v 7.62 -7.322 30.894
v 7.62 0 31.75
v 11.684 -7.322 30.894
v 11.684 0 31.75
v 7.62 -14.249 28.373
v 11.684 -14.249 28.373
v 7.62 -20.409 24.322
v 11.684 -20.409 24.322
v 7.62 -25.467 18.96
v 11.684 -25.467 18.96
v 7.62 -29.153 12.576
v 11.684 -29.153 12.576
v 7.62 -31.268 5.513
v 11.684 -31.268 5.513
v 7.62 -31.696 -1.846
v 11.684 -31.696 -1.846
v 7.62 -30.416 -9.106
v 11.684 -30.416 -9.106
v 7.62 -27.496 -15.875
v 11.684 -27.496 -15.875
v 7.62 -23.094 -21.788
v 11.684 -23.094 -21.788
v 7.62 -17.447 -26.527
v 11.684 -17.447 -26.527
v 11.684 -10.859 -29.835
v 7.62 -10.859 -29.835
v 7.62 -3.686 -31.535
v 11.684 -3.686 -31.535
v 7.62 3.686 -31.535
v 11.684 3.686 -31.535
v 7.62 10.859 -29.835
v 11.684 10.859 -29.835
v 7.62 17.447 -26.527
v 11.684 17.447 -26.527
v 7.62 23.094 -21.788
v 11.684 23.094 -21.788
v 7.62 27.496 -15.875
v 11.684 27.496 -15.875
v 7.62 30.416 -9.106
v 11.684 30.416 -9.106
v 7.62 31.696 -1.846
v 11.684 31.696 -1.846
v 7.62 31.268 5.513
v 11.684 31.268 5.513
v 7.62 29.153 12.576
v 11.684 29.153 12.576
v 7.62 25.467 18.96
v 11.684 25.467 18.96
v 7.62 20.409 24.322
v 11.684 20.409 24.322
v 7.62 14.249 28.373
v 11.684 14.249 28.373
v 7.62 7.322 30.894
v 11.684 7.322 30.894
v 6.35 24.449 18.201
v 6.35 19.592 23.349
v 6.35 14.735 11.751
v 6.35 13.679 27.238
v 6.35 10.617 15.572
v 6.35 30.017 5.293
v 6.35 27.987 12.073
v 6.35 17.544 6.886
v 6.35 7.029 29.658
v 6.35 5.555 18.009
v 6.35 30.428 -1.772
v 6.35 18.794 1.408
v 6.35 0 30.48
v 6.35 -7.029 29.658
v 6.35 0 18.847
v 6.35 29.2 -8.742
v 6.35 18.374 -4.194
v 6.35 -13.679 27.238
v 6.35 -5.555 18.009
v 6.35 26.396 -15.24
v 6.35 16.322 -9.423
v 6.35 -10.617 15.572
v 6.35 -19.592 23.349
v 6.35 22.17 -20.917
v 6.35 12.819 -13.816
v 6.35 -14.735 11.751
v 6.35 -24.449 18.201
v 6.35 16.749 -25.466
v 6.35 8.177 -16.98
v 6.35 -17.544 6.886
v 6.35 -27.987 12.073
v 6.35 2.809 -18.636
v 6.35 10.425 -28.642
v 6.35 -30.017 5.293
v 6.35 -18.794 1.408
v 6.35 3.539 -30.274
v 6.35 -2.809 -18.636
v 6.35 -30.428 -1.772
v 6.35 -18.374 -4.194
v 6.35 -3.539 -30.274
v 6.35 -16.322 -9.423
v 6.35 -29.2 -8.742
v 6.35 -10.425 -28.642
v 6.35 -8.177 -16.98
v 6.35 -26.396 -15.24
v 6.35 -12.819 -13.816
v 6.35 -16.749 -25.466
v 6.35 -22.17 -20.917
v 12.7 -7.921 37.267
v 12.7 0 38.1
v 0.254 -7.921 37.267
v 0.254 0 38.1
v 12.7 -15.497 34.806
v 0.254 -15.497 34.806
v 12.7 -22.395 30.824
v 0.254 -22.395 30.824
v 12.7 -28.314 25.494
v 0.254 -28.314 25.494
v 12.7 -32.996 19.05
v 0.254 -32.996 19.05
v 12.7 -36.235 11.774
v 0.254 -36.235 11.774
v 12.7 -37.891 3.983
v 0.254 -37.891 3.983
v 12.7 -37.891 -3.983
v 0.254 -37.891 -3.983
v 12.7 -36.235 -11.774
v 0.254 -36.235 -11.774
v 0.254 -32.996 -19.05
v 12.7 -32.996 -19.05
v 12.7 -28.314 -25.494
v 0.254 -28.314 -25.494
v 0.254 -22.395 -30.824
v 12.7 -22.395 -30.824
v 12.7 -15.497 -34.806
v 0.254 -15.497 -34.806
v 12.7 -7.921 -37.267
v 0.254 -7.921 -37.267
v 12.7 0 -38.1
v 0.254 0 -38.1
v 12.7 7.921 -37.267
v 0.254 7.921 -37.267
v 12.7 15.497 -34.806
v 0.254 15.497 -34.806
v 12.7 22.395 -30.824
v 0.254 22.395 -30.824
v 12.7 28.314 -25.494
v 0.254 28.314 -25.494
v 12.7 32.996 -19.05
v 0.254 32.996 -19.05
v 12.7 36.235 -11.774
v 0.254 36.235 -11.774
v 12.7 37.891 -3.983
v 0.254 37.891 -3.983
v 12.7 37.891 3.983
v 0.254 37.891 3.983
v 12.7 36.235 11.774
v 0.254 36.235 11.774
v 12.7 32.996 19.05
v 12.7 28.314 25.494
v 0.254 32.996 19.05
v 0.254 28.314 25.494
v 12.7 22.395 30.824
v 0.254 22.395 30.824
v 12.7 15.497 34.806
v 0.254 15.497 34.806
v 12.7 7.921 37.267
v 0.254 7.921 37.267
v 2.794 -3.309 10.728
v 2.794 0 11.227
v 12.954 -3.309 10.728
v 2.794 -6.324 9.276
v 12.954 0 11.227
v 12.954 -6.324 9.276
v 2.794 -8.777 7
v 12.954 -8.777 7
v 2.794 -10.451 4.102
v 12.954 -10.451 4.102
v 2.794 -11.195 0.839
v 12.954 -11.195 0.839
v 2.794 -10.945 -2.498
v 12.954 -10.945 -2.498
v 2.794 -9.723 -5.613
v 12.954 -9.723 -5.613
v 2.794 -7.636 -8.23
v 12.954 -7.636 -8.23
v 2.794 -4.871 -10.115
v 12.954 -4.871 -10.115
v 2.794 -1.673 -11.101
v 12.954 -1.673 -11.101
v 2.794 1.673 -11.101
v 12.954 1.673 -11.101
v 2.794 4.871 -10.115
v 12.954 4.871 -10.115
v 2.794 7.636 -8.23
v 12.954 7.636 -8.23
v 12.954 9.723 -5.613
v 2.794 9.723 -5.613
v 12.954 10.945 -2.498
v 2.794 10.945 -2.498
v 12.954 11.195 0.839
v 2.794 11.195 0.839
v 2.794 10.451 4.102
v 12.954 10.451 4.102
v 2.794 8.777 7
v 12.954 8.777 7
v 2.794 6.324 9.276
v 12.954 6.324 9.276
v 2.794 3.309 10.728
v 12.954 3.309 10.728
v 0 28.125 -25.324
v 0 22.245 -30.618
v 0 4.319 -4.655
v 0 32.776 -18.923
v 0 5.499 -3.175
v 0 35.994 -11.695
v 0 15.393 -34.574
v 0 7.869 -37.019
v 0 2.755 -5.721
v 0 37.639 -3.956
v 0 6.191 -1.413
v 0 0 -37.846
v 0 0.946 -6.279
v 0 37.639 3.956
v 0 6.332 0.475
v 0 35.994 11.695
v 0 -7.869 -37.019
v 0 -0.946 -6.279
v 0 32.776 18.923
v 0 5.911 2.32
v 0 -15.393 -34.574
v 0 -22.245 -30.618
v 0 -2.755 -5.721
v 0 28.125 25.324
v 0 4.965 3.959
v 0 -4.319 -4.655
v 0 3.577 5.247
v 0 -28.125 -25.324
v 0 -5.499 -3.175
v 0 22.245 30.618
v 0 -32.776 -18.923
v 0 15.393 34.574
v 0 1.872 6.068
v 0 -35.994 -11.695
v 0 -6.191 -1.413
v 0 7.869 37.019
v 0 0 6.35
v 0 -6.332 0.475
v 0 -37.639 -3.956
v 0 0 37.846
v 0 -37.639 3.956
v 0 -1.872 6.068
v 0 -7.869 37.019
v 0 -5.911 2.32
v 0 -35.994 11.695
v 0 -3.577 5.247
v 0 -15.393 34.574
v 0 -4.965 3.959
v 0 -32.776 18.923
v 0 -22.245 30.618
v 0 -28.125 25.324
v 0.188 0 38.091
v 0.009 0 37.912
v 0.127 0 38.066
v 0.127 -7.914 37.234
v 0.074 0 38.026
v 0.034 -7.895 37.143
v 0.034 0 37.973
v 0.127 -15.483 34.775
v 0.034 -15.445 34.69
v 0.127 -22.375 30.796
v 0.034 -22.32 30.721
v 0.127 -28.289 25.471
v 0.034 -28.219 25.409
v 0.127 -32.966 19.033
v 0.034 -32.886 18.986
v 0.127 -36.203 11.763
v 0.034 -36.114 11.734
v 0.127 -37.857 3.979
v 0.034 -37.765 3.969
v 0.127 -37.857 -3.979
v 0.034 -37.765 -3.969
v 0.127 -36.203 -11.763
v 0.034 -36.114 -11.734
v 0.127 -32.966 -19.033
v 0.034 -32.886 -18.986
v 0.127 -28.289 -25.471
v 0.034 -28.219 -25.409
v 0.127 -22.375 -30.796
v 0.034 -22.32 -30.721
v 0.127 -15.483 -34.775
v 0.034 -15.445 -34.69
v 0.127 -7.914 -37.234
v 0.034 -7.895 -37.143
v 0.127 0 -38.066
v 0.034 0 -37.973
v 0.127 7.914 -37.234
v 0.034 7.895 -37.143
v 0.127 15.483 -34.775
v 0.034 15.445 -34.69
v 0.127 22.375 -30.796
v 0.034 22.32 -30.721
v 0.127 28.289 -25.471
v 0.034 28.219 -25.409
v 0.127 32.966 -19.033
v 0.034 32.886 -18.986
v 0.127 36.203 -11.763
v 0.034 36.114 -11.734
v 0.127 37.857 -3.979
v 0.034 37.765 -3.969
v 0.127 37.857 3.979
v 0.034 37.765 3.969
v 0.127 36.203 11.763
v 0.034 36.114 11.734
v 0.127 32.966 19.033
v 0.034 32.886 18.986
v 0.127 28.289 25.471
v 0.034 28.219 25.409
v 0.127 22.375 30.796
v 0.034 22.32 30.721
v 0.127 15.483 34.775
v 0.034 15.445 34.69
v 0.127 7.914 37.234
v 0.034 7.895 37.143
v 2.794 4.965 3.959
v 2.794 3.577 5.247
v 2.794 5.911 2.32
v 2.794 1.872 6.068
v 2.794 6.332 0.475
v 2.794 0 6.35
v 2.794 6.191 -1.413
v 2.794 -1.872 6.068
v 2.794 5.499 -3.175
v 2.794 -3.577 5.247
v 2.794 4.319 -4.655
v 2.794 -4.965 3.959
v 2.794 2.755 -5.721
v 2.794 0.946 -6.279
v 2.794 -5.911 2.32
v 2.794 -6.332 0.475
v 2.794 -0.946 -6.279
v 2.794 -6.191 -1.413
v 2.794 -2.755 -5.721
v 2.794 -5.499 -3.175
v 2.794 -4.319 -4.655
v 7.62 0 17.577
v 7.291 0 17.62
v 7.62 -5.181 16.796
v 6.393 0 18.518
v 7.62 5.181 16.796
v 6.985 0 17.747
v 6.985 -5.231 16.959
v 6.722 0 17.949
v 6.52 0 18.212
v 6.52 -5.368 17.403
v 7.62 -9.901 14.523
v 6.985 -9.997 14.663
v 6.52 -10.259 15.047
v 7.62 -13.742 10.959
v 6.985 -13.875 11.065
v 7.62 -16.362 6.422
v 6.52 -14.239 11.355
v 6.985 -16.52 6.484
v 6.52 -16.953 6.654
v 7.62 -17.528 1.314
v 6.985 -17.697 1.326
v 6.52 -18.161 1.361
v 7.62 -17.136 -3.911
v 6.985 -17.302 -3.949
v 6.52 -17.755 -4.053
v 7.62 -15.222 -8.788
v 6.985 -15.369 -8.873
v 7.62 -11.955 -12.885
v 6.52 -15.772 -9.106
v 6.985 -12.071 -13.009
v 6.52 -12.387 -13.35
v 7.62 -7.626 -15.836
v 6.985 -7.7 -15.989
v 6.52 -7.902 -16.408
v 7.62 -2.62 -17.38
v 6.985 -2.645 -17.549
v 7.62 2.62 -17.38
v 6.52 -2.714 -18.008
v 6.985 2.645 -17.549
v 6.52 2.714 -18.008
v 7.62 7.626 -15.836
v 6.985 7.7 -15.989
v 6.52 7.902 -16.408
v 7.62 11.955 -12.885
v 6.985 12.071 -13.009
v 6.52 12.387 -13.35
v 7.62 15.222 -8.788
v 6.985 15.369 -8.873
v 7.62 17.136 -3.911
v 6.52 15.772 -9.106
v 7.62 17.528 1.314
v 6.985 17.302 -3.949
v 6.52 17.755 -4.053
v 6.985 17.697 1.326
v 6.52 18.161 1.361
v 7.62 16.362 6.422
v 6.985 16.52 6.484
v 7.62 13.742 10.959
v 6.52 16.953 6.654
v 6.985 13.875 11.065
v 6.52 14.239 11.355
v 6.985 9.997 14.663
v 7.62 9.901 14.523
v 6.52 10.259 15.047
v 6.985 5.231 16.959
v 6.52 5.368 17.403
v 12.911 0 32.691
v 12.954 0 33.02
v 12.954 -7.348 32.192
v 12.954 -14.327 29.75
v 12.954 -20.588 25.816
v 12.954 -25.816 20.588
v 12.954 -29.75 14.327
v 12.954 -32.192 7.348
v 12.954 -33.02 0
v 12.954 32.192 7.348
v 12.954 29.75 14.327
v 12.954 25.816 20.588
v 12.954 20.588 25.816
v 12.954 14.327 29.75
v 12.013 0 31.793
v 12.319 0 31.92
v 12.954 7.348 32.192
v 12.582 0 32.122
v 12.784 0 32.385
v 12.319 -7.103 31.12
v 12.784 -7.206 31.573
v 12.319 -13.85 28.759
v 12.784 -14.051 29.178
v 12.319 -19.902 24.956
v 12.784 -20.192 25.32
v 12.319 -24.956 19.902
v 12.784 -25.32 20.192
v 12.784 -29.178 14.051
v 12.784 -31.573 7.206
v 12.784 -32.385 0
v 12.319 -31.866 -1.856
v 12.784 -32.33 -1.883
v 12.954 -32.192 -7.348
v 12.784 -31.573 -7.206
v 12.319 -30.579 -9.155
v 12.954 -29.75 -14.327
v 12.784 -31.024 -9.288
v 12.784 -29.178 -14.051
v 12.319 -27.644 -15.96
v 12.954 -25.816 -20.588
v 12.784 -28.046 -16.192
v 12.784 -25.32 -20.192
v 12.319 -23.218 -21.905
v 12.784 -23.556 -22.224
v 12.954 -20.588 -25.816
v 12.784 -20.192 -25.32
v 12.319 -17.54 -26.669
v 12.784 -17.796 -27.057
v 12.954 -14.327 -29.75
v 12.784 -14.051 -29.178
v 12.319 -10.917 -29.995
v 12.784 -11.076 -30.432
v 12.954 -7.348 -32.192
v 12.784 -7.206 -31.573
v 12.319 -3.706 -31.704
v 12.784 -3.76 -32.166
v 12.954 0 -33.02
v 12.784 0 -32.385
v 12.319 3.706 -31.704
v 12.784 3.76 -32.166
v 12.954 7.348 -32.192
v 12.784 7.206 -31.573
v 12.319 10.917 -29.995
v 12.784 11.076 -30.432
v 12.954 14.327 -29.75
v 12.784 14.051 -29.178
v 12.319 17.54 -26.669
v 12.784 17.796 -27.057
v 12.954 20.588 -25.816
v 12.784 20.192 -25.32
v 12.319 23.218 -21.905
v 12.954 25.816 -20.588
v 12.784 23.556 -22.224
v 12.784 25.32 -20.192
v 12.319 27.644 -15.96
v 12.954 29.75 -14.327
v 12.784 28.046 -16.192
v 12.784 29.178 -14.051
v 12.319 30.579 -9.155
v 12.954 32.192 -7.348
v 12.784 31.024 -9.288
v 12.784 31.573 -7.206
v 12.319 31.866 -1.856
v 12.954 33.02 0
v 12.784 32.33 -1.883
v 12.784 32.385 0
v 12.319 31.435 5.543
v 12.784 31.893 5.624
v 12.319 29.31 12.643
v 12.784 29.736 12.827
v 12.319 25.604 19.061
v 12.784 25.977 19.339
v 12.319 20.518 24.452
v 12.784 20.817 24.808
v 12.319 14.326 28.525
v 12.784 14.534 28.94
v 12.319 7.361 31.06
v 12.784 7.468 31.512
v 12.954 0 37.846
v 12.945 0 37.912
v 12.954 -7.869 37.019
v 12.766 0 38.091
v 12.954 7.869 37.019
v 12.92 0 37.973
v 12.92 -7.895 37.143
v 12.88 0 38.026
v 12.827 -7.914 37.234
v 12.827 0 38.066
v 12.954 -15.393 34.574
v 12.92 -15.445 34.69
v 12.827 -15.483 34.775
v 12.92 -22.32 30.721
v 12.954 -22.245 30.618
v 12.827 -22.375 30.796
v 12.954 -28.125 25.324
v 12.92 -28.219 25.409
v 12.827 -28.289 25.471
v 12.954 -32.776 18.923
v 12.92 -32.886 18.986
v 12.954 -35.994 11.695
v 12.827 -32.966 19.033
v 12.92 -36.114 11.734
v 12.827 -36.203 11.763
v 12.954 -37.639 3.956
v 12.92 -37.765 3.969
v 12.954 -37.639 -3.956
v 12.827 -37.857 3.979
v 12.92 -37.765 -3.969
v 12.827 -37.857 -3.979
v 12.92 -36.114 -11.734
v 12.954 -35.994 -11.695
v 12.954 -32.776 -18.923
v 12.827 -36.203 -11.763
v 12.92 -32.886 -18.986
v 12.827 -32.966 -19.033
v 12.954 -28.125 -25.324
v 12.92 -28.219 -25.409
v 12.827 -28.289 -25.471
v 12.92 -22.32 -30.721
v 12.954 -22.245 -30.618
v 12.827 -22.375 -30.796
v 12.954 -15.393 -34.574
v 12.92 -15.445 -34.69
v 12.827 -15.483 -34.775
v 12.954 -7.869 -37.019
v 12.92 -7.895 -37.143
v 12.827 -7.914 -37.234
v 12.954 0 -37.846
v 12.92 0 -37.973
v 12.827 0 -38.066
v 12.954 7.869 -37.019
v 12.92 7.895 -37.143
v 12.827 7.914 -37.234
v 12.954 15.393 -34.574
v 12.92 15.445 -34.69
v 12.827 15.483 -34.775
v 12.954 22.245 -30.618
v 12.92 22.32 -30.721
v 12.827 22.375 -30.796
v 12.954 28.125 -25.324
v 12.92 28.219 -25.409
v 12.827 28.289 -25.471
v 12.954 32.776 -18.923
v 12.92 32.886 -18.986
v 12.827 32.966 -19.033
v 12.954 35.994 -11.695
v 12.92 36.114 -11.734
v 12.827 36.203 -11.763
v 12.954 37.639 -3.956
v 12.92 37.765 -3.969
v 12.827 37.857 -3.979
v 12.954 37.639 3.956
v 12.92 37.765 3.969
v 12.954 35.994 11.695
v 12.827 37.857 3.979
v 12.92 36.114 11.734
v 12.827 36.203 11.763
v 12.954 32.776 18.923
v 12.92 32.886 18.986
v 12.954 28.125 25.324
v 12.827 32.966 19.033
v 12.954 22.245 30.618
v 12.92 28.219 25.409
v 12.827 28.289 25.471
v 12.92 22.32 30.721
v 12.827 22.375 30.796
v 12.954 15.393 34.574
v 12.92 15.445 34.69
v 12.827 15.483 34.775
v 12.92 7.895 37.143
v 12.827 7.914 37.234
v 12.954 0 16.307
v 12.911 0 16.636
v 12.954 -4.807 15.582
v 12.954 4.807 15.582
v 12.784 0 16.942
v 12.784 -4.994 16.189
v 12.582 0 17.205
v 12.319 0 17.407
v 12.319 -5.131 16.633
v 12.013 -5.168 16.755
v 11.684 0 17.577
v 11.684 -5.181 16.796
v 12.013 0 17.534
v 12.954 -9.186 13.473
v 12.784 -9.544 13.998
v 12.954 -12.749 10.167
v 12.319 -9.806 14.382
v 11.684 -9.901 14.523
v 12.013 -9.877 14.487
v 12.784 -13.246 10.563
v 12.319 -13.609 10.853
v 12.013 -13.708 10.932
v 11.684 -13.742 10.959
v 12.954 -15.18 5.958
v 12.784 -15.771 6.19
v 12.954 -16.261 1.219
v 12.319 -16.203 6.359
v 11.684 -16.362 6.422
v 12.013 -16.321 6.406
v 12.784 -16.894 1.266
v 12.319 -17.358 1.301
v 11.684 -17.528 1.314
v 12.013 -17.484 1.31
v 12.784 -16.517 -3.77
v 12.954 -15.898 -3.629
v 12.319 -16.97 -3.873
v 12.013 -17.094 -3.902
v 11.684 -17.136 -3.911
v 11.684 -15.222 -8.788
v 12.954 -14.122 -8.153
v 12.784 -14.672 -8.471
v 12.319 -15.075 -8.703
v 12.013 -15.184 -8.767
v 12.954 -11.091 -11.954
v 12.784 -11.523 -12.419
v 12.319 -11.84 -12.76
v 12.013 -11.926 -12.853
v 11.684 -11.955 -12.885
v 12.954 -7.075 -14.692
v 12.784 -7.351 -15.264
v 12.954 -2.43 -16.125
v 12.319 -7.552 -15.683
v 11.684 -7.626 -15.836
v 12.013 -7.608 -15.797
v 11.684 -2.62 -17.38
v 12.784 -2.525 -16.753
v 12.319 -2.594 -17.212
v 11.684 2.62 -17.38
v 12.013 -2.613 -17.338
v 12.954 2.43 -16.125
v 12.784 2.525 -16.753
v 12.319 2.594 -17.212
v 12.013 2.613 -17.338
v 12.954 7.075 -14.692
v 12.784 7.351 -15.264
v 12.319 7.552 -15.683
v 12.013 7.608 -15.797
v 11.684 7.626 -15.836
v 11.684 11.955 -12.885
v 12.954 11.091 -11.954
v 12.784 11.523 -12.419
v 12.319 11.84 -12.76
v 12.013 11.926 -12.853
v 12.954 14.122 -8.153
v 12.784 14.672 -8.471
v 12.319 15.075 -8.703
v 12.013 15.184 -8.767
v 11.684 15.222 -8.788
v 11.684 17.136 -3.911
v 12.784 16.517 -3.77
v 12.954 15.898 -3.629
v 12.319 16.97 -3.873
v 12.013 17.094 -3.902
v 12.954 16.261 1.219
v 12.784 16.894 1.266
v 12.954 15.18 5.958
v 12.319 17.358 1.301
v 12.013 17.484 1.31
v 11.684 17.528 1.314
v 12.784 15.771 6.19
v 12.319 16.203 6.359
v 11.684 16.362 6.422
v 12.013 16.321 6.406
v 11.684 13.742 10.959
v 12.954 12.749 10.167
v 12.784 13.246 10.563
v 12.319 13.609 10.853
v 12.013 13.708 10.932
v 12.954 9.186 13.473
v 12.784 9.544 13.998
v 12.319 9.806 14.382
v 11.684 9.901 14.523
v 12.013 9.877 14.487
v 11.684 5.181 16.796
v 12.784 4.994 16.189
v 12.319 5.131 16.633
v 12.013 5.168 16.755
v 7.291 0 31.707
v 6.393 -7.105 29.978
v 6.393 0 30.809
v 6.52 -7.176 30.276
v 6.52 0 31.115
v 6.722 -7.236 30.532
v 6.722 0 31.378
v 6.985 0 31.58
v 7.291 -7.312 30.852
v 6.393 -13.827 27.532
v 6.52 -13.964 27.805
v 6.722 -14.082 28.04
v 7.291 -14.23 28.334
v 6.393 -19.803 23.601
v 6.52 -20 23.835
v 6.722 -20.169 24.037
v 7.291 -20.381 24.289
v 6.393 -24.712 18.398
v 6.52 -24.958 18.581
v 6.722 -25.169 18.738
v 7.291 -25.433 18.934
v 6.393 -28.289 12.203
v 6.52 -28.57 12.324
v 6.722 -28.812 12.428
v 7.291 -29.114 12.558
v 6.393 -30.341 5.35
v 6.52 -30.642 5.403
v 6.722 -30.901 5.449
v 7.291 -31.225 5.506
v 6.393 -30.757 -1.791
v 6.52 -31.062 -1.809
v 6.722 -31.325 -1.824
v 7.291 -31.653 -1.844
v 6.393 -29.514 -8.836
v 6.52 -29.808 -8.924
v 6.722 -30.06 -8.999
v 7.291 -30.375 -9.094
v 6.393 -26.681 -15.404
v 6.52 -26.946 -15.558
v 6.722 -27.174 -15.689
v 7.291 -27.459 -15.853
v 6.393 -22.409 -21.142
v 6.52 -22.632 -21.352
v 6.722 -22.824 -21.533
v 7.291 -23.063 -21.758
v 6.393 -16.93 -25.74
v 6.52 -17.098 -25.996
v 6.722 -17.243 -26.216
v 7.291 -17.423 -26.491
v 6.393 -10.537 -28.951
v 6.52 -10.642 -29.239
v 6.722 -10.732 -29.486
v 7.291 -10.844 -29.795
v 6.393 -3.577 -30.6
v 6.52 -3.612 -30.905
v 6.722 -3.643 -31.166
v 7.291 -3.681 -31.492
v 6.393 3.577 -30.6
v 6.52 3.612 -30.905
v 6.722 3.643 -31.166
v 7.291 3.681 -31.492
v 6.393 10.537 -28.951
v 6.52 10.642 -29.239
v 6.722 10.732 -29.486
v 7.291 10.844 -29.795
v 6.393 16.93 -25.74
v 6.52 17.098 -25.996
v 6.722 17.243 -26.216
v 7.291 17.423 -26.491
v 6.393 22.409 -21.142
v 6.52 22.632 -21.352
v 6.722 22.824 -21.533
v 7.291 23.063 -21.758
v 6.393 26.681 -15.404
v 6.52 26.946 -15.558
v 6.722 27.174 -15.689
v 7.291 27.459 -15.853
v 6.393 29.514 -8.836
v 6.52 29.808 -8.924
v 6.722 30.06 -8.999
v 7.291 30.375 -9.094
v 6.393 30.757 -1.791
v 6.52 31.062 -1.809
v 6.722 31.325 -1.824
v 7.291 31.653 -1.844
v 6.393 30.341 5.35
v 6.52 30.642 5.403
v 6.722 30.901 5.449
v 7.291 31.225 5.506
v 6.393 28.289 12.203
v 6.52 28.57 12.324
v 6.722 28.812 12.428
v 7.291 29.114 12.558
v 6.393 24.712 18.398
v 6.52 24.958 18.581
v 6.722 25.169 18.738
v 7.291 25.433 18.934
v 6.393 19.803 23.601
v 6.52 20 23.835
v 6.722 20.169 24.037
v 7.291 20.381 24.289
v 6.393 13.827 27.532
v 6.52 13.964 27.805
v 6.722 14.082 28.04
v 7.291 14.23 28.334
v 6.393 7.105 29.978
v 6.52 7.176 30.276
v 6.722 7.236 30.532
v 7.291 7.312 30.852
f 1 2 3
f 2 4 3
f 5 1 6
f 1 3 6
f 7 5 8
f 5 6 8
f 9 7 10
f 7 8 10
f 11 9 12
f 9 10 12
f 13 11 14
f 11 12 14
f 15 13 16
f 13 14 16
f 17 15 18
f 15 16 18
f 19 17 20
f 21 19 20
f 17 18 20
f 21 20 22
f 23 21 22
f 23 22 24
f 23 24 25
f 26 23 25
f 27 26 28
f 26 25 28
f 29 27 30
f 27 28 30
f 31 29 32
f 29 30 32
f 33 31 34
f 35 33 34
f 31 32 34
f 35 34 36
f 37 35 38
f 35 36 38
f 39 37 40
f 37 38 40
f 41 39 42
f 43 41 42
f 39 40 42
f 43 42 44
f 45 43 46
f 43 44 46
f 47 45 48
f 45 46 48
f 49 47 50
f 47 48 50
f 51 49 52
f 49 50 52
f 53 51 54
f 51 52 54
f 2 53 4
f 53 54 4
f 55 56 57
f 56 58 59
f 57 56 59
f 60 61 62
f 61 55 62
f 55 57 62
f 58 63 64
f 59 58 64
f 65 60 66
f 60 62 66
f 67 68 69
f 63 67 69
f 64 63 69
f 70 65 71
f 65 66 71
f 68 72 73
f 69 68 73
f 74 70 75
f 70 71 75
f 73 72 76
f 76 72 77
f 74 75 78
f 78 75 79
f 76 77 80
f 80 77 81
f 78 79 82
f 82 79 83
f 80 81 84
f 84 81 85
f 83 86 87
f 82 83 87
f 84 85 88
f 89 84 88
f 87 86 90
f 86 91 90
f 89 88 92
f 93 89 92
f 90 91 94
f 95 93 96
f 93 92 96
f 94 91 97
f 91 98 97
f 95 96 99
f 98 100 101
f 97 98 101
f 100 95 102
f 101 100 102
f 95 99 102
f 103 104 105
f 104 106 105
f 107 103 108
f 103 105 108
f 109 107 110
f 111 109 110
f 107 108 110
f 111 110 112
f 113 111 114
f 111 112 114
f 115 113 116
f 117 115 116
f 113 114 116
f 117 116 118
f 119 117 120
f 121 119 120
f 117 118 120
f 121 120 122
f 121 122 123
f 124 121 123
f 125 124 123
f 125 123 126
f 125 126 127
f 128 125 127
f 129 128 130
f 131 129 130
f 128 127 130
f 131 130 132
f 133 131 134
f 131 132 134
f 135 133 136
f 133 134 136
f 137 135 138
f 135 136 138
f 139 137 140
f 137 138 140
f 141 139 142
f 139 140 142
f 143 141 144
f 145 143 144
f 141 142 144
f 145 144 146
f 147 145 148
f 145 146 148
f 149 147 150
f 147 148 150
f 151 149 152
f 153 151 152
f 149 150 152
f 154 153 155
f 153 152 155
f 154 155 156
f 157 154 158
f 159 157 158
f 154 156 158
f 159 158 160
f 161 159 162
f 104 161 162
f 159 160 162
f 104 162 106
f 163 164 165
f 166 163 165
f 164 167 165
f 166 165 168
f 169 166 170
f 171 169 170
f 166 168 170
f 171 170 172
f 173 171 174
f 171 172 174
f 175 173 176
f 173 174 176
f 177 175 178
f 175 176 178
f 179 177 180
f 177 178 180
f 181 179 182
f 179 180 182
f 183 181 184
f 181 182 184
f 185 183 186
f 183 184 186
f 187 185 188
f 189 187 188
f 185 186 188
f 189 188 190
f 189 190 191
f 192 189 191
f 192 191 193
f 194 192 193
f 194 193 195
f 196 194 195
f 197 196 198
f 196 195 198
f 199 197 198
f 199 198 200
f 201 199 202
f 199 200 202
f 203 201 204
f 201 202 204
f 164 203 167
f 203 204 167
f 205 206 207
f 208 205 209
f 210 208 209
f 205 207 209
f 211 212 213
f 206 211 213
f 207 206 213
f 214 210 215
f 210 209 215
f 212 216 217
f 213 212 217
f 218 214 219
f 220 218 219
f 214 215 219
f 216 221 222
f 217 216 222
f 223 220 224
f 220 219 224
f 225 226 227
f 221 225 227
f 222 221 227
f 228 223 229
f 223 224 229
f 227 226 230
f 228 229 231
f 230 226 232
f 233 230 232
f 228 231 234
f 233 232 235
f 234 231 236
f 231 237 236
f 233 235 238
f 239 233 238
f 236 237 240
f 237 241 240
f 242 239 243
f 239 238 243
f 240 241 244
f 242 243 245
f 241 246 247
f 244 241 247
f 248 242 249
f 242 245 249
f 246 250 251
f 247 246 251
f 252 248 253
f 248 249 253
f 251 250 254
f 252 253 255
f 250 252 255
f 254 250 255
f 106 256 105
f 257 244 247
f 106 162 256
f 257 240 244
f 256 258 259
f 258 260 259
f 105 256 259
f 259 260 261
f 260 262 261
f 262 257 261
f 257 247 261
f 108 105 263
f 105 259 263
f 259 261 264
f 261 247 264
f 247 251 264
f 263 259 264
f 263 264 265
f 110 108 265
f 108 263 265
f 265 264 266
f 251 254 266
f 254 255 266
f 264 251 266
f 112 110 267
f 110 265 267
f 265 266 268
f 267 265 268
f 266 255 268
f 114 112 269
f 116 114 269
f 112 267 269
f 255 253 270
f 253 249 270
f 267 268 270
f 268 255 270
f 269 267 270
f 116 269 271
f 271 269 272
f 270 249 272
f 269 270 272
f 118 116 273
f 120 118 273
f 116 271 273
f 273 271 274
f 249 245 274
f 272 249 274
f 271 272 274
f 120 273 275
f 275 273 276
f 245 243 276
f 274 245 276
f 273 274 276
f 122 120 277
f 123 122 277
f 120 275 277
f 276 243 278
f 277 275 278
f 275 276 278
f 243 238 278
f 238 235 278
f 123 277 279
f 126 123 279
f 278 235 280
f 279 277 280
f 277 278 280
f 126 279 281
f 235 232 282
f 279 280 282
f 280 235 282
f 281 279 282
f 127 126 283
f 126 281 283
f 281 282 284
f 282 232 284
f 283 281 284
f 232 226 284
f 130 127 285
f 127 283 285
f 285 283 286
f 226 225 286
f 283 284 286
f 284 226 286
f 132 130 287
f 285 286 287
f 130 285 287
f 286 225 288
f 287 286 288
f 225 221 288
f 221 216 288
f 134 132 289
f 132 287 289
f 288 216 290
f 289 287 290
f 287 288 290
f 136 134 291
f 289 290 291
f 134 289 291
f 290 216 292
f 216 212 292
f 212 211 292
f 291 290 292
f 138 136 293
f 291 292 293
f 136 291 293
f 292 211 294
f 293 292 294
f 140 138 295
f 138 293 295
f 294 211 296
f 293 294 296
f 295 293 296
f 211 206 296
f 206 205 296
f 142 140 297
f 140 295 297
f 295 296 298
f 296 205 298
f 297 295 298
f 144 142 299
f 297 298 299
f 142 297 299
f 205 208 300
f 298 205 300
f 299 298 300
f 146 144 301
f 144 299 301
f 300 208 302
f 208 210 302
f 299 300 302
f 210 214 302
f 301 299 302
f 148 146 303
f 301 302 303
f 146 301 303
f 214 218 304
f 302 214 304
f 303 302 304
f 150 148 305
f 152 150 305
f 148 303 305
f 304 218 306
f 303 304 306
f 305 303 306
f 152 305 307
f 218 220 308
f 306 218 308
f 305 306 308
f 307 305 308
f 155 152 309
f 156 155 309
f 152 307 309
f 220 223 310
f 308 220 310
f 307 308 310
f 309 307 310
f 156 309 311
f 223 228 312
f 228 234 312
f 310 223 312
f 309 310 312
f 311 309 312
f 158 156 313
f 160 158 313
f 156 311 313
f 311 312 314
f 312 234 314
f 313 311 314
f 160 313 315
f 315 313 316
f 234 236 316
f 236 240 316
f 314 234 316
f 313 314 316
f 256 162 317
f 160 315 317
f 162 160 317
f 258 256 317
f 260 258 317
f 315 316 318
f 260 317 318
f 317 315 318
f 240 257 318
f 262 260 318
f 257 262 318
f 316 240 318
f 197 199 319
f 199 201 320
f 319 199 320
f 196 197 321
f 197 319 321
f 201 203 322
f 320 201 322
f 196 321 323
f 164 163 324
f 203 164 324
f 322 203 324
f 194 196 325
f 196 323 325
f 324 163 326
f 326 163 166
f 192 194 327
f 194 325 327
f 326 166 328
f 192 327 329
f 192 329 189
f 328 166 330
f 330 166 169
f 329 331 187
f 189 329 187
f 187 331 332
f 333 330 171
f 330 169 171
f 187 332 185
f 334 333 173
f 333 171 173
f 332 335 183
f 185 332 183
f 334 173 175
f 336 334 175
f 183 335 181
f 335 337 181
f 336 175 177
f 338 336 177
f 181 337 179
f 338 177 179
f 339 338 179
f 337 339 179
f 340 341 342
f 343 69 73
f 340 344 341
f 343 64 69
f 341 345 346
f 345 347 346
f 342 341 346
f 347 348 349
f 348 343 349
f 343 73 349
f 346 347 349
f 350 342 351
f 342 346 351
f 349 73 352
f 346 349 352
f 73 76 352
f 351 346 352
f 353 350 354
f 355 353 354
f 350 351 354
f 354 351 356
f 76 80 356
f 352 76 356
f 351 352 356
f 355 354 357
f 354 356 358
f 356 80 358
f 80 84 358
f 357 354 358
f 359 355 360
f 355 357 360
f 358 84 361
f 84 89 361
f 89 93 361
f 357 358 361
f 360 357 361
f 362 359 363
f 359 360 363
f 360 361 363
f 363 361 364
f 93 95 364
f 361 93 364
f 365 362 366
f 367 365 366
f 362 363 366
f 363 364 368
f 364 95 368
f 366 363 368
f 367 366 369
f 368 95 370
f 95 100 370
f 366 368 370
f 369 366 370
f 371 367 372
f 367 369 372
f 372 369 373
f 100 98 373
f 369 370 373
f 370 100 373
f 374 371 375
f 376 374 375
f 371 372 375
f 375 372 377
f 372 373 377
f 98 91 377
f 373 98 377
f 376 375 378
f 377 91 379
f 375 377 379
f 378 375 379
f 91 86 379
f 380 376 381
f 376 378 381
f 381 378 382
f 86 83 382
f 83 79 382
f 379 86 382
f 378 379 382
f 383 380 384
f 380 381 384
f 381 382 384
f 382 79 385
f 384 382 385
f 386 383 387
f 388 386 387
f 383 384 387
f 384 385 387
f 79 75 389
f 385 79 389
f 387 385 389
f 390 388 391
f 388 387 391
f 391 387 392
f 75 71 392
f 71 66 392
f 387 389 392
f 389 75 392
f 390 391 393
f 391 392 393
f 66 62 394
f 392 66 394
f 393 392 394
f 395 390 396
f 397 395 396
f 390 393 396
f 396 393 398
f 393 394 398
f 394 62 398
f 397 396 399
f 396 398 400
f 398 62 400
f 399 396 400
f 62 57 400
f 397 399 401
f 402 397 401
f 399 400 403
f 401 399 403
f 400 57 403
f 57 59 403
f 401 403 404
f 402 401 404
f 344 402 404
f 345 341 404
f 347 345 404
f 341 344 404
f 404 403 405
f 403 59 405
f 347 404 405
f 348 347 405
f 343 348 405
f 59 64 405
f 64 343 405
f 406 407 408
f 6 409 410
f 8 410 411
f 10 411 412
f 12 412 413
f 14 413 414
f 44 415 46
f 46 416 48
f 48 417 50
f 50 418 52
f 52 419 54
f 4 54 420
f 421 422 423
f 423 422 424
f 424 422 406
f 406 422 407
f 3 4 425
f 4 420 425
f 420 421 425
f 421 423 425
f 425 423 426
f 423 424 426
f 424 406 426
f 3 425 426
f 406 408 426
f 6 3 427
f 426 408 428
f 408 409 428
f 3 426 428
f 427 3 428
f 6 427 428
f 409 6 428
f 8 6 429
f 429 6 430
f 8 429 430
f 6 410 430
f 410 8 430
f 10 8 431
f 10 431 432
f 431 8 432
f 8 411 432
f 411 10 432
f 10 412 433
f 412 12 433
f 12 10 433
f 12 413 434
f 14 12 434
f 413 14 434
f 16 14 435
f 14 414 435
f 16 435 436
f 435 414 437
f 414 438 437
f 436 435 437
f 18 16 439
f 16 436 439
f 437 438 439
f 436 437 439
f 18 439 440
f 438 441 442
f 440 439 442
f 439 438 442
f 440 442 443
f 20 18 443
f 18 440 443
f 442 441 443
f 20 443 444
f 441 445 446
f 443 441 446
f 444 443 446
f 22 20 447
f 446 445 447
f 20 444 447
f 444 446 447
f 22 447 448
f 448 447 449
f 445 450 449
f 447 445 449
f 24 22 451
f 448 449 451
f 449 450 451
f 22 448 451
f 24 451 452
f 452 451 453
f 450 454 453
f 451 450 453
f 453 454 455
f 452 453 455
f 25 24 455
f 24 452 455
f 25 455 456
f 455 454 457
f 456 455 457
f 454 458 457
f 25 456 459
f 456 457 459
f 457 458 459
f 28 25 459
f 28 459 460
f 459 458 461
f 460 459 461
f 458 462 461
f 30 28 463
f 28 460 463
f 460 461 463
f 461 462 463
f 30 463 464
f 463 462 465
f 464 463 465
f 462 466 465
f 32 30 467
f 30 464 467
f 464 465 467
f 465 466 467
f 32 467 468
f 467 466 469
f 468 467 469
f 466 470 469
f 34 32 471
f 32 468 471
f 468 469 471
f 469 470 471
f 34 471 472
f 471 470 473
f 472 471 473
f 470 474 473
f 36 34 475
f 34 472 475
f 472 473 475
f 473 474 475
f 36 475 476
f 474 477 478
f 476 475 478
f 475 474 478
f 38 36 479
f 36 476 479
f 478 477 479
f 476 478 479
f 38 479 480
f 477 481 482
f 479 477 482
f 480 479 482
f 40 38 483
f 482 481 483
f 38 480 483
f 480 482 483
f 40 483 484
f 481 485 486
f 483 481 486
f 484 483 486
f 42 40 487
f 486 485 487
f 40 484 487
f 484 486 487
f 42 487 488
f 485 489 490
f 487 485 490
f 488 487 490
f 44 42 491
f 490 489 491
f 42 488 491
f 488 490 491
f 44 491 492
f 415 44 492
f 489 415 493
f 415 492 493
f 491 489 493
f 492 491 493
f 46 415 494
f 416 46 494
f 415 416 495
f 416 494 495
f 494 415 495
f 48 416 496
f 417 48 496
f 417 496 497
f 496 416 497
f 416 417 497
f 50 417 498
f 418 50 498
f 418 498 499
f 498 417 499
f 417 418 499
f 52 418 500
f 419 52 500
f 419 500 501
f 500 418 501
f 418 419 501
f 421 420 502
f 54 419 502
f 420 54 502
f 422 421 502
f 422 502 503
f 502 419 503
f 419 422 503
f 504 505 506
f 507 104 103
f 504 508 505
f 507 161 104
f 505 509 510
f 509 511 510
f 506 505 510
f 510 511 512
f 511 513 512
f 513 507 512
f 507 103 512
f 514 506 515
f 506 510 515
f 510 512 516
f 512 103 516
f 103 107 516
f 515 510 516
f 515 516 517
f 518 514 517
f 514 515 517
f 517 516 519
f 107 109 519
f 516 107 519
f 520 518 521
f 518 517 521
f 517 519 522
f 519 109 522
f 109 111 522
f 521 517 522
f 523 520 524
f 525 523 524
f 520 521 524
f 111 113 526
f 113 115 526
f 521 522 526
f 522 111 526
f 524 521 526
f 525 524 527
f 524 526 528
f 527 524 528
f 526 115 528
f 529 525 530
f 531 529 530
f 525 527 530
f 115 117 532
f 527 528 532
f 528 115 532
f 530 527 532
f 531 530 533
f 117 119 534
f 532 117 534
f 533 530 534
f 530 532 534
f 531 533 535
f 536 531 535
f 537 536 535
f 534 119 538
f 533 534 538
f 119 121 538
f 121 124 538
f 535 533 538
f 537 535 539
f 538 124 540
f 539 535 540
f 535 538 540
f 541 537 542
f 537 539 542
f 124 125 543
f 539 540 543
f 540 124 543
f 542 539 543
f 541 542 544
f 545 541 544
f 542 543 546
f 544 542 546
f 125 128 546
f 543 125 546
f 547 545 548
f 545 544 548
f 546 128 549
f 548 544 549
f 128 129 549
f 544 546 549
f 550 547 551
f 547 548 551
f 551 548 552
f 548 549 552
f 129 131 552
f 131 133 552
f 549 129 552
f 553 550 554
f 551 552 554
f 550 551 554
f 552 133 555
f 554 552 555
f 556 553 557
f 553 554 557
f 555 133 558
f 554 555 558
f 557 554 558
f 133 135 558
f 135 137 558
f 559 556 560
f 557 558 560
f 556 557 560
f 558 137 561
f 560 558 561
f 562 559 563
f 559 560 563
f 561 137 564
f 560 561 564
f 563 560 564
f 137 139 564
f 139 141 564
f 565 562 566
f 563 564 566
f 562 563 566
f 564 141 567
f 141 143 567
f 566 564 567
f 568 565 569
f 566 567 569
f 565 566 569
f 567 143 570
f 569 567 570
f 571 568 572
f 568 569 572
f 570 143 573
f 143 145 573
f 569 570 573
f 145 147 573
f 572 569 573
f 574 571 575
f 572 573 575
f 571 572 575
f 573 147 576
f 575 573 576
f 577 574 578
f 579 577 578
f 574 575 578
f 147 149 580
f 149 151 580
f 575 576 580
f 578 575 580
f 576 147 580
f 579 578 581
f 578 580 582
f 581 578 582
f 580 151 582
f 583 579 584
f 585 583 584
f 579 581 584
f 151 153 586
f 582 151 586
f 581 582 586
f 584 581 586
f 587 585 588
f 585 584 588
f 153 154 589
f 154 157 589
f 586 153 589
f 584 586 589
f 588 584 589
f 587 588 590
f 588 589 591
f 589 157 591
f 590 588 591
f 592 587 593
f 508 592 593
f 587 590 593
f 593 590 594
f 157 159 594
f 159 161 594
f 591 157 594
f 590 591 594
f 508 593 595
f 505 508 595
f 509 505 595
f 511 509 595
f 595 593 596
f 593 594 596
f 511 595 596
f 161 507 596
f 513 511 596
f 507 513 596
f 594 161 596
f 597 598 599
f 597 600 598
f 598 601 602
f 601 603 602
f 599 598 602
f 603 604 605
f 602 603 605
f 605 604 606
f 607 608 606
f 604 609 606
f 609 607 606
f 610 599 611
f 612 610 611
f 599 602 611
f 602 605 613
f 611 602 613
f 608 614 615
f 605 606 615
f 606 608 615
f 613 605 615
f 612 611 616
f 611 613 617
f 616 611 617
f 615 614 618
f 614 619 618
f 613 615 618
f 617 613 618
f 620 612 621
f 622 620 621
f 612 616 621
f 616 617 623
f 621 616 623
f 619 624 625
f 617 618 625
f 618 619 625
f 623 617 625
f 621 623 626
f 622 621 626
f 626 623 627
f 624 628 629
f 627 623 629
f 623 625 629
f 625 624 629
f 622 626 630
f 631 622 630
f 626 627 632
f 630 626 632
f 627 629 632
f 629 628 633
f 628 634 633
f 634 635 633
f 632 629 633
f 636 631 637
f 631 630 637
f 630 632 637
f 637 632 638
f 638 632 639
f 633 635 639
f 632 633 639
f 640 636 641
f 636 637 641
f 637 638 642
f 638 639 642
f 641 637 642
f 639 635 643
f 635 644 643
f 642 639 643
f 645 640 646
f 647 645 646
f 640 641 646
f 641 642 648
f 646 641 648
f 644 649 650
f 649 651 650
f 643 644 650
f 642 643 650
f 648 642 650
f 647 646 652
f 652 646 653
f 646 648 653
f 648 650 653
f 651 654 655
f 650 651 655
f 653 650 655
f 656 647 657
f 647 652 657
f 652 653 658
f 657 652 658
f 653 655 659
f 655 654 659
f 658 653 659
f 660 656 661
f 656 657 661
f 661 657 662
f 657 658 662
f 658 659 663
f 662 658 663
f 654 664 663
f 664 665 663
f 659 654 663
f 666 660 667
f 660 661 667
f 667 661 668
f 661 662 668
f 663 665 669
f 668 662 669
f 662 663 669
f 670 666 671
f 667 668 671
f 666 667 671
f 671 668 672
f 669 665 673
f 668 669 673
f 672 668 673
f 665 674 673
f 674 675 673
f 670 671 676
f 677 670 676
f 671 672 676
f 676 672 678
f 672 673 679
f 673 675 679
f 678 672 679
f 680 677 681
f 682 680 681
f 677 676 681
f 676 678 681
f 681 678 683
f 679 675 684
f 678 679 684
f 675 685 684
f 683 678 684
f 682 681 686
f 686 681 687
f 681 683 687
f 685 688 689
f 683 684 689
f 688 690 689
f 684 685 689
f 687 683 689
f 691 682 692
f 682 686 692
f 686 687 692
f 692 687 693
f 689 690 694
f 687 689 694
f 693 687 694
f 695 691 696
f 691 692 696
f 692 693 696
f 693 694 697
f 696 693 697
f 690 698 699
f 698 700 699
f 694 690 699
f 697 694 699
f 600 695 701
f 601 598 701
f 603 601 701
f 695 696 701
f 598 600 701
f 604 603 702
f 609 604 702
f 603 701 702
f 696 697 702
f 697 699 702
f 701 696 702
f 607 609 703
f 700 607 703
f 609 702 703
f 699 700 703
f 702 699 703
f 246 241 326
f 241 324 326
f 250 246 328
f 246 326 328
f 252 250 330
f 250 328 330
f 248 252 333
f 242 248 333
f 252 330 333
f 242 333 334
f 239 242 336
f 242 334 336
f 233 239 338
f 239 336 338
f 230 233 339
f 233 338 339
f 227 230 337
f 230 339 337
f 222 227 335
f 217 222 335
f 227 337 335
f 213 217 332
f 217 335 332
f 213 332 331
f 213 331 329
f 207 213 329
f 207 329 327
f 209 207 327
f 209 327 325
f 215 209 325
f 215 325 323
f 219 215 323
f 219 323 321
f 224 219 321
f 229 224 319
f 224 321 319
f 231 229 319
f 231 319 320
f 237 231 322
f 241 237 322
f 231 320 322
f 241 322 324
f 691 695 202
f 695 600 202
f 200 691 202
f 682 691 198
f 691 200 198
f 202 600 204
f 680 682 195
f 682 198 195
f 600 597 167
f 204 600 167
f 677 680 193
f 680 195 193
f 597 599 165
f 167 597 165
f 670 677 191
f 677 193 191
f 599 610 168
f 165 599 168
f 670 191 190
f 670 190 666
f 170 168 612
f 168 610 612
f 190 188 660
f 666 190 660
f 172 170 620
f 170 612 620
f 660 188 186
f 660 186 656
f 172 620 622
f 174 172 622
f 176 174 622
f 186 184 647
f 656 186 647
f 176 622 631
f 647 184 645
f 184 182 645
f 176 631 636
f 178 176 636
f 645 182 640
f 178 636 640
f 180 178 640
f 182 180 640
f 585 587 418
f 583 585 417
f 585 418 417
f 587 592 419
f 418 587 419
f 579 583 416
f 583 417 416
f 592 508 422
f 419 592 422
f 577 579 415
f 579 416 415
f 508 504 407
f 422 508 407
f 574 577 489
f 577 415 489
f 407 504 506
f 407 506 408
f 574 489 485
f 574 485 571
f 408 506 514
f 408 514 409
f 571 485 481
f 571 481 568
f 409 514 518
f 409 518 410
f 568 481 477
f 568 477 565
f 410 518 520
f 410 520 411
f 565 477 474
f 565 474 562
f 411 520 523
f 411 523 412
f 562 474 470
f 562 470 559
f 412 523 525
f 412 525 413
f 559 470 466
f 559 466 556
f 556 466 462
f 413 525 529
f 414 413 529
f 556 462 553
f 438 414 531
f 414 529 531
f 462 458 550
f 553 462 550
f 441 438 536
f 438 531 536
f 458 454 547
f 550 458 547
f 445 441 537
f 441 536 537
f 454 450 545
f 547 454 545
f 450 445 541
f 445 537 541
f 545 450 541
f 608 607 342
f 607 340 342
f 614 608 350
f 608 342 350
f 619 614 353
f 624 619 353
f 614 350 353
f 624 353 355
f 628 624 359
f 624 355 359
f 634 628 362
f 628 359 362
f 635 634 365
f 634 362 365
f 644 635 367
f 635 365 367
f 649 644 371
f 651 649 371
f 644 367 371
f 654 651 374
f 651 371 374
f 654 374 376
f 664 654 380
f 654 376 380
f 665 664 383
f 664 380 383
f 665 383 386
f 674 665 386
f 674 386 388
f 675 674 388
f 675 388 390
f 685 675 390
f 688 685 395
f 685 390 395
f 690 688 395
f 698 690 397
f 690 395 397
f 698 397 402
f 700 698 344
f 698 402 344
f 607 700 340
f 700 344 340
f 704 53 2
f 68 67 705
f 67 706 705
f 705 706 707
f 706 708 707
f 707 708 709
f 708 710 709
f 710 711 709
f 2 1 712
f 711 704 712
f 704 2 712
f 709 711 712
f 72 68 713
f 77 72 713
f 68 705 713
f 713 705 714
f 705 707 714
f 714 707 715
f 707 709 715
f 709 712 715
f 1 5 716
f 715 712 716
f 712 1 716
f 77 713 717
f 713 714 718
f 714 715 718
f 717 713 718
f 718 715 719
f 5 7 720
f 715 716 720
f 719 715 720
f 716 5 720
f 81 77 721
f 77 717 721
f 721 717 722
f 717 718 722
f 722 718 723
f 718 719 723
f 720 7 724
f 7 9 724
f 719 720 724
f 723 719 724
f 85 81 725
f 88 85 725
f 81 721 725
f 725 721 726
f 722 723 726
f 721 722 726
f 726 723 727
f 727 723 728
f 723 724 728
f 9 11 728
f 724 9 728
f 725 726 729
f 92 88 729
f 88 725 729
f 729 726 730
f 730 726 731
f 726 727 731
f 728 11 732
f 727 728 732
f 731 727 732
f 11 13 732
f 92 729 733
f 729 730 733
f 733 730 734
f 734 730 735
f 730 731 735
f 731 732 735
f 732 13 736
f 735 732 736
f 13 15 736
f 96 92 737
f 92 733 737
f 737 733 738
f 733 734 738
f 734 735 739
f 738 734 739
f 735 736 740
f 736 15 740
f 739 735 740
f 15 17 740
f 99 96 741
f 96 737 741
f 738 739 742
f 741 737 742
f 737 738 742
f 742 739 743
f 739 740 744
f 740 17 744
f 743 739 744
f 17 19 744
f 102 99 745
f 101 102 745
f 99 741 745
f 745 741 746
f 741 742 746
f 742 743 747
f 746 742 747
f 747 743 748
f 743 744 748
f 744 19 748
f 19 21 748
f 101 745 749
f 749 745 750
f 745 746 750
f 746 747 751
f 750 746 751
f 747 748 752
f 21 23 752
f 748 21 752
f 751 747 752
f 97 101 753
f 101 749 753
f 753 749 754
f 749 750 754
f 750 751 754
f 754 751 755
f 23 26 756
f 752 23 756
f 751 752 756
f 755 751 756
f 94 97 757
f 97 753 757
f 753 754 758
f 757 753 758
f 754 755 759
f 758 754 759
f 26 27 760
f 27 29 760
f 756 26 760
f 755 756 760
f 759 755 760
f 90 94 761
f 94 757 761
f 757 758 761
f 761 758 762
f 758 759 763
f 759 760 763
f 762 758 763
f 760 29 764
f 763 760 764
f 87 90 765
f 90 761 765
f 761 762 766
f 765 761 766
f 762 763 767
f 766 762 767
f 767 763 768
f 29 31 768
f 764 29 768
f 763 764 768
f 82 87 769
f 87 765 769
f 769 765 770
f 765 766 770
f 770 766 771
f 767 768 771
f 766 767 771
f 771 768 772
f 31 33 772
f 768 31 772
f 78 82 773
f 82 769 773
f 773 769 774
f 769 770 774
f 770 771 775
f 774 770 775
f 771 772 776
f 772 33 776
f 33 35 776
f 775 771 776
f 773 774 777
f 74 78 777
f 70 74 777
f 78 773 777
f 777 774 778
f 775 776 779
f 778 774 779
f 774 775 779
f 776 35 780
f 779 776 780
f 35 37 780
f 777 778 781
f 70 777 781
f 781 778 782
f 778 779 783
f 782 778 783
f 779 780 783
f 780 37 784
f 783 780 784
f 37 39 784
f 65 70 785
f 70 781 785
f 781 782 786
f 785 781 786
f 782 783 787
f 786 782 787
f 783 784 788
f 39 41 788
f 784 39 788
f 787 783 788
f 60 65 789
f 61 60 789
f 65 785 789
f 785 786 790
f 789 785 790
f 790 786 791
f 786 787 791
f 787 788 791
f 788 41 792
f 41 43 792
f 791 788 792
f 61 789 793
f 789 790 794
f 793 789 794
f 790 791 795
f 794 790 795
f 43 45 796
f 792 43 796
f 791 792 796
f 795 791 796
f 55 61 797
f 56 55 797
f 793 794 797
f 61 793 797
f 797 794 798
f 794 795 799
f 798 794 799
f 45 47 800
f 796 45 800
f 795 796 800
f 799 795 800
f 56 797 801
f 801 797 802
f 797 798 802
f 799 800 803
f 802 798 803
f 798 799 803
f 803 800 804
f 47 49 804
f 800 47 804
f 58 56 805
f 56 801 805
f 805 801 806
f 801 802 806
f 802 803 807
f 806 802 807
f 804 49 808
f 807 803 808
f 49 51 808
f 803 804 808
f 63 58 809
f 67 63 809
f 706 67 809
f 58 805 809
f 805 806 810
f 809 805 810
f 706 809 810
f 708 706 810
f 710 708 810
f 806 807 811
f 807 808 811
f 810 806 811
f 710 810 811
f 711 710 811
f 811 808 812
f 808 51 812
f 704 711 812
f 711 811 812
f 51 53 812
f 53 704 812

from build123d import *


with BuildPart() as f1:
    # F0 (on Front) → F1 (revolve)
    with BuildSketch(Plane.XZ):
        with BuildLine():
            Line((12.7, 38.1), (0.254, 38.1))
            ThreePointArc((0.254, 38.1), (0.074395, 38.025605), (0, 37.846))
            Line((0, 37.846), (0, 6.35))
            Line((0, 6.35), (2.794, 6.35))
            Line((2.794, 6.35), (2.794, 11.2268))
            Line((2.794, 11.2268), (12.954, 11.2268))
            Line((12.954, 11.2268), (12.954, 16.3068))
            ThreePointArc((12.954, 16.3068), (12.582026, 17.204826), (11.684, 17.5768))
            Line((11.684, 17.5768), (7.62, 17.5768))
            ThreePointArc((7.62, 17.5768), (6.721974, 17.948774), (6.35, 18.8468))
            Line((6.35, 18.8468), (6.35, 30.48))
            ThreePointArc((6.35, 30.48), (6.721974, 31.378026), (7.62, 31.75))
            Line((7.62, 31.75), (11.684, 31.75))
            ThreePointArc((11.684, 31.75), (12.582026, 32.121974), (12.954, 33.02))
            Line((12.954, 33.02), (12.954, 37.846))
            ThreePointArc((12.954, 37.846), (12.879605, 38.025605), (12.7, 38.1))
        make_face()
    revolve(axis=Axis((23.369942, 0, 0), (1, 0, 0)))


solid = f1.part
